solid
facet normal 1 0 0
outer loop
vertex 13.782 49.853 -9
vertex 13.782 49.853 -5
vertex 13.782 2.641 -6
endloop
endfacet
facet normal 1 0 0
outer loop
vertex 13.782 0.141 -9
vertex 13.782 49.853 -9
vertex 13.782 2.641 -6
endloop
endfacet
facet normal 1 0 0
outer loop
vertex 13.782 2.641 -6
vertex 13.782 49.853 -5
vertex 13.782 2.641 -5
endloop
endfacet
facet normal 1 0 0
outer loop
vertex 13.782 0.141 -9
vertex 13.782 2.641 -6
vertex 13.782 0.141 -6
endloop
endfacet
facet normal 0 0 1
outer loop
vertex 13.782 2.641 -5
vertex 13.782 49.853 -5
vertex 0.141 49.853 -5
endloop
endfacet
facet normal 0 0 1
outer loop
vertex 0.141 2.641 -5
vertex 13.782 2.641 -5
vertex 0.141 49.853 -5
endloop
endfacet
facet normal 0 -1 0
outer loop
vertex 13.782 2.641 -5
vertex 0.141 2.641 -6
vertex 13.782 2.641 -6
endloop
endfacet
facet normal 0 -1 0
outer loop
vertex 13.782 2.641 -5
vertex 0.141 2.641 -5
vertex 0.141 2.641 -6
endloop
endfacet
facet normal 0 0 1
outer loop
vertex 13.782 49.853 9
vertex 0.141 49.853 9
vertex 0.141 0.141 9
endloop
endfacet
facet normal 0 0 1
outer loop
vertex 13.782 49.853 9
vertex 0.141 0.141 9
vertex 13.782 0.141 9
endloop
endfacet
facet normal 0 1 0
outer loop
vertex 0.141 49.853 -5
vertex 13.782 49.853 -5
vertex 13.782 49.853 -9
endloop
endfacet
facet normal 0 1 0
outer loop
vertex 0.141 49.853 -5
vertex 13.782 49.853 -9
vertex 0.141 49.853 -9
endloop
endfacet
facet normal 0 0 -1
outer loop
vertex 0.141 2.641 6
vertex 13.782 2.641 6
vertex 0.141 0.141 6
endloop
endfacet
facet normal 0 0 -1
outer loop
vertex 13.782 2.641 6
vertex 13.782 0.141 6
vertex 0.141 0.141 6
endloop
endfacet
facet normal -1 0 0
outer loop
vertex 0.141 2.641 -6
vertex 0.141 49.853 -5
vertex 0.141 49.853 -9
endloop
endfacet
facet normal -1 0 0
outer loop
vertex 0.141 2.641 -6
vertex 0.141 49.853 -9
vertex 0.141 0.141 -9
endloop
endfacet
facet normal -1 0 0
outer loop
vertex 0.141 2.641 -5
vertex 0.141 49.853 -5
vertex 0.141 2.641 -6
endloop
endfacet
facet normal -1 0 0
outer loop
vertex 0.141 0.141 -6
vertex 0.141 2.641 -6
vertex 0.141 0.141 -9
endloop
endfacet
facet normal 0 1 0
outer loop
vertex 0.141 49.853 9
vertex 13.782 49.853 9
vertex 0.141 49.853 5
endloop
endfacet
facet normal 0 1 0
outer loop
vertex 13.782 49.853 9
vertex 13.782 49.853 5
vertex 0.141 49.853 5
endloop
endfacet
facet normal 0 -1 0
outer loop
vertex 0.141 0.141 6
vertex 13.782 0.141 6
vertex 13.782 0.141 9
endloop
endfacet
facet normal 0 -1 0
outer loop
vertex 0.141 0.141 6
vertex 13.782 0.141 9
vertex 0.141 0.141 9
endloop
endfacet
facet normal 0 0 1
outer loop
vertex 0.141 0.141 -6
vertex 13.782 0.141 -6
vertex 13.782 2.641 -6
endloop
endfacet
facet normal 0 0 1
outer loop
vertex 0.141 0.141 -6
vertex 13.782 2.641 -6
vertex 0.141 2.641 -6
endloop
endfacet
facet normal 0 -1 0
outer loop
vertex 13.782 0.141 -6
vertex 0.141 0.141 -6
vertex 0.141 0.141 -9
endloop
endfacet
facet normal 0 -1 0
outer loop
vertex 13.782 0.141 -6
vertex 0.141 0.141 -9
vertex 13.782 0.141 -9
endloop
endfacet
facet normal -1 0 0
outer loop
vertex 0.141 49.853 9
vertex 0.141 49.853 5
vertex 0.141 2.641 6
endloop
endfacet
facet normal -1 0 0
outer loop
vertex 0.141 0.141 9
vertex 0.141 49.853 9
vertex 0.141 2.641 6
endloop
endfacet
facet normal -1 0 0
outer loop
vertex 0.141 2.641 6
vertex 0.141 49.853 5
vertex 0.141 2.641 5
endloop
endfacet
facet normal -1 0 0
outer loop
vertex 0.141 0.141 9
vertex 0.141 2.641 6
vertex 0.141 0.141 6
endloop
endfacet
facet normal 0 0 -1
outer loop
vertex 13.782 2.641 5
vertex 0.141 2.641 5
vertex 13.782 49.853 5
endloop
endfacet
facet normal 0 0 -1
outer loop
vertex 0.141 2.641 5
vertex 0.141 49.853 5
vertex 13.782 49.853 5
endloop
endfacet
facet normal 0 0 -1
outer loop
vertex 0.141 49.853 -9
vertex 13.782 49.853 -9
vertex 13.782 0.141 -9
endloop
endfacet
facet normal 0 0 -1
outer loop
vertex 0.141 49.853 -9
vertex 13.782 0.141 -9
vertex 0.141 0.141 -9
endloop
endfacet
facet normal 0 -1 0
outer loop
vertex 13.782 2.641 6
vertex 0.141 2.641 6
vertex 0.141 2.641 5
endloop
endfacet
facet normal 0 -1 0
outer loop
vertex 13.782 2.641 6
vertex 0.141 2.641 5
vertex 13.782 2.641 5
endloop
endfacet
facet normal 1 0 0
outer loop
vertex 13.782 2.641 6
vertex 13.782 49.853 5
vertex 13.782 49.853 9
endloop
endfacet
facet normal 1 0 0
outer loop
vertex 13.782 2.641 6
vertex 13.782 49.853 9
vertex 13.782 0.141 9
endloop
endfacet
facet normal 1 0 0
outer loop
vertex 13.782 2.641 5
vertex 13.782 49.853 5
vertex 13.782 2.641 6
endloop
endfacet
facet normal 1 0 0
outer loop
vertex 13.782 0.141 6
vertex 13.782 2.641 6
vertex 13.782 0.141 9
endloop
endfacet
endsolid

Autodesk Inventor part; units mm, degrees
ref_plane "YZ Plane" through (0, 0, 0) normal (1, 0, 0) x (0, 1, 0)
ref_plane "XZ Plane" through (0, 0, 0) normal (0, 1, 0) x (-1, 0, 0)
ref_plane "XY Plane" through (0, 0, 0) normal (0, 0, 1) x (1, 0, 0)
sketch "Sketch1" plane through (13.782, 4.103, 5) normal (0, 0, 1) x (1, 0, 0)
  line L0 (-13.641, 45.75) -> (-13.641, -3.962) projected
  line L1 (2, 45.75) -> (-13.641, 45.75) projected
  line L2 (-13.641, -3.962) -> (-13.641, 45.75)
  line L3 (-13.641, 45.75) -> (0, 45.75)
  line L4 (0, 45.75) -> (0, 33.5)
  line L5 (0, 33.5) -> (0, -3.962)
  line L6 (0, -3.962) -> (-13.641, -3.962)
  point P0 (-13.782, -4.103)
extrude "Extrusion1" add sketch "Sketch1" along normal blind 4
sketch "Sketch2" plane through (4.5, 3.103, -5) normal (0, 0, -1) x (-1, 0, 0)
  line L0 (4.359, 46.75) -> (4.359, -2.962) projected
  line L1 (4.359, -2.962) -> (4.359, 46.75)
  line L2 (-9.282, 46.75) -> (4.359, 46.75) projected
  line L3 (4.359, 46.75) -> (-9.282, 46.75)
  line L4 (4.359, -2.962) -> (-9.282, -2.962) projected
  line L5 (-9.282, 46.75) -> (-9.282, -2.962)
  line L6 (-9.282, -2.962) -> (4.359, -2.962)
  point P0 (4.5, -3.103)
extrude "Extrusion2" add sketch "Sketch2" along normal blind 4
sketch "Sketch3" plane through (0.141, 0.141, 5) normal (0, -1, 0) x (1, 0, 0)
  line L0 (0, 0) -> (13.641, 0) projected
  line L1 (13.641, 0) -> (13.641, 1)
  line L2 (13.641, 0) -> (13.641, 4) projected
  line L3 (13.641, 1) -> (0, 1)
  line L4 (0, 0) -> (0, 4) projected
  line L5 (0, 1) -> (0, 0)
  line L6 (0, 0) -> (13.641, 0)
  line L7 (0, -10) -> (13.641, -10) projected
  line L8 (13.641, -10) -> (13.641, -11)
  line L9 (13.641, -10) -> (13.641, -14) projected
  line L10 (13.641, -11) -> (0, -11)
  line L11 (0, -10) -> (0, -14) projected
  line L12 (0, -10) -> (0, -11)
  line L13 (0, -10) -> (13.641, -10)
  point P0 (-0.141, -5)
  dimension "d4" = 1
  dimension "d5" = 1
extrude "Extrusion3" cut sketch "Sketch3" against normal blind 2.5
properties part number "DIN_mount"
